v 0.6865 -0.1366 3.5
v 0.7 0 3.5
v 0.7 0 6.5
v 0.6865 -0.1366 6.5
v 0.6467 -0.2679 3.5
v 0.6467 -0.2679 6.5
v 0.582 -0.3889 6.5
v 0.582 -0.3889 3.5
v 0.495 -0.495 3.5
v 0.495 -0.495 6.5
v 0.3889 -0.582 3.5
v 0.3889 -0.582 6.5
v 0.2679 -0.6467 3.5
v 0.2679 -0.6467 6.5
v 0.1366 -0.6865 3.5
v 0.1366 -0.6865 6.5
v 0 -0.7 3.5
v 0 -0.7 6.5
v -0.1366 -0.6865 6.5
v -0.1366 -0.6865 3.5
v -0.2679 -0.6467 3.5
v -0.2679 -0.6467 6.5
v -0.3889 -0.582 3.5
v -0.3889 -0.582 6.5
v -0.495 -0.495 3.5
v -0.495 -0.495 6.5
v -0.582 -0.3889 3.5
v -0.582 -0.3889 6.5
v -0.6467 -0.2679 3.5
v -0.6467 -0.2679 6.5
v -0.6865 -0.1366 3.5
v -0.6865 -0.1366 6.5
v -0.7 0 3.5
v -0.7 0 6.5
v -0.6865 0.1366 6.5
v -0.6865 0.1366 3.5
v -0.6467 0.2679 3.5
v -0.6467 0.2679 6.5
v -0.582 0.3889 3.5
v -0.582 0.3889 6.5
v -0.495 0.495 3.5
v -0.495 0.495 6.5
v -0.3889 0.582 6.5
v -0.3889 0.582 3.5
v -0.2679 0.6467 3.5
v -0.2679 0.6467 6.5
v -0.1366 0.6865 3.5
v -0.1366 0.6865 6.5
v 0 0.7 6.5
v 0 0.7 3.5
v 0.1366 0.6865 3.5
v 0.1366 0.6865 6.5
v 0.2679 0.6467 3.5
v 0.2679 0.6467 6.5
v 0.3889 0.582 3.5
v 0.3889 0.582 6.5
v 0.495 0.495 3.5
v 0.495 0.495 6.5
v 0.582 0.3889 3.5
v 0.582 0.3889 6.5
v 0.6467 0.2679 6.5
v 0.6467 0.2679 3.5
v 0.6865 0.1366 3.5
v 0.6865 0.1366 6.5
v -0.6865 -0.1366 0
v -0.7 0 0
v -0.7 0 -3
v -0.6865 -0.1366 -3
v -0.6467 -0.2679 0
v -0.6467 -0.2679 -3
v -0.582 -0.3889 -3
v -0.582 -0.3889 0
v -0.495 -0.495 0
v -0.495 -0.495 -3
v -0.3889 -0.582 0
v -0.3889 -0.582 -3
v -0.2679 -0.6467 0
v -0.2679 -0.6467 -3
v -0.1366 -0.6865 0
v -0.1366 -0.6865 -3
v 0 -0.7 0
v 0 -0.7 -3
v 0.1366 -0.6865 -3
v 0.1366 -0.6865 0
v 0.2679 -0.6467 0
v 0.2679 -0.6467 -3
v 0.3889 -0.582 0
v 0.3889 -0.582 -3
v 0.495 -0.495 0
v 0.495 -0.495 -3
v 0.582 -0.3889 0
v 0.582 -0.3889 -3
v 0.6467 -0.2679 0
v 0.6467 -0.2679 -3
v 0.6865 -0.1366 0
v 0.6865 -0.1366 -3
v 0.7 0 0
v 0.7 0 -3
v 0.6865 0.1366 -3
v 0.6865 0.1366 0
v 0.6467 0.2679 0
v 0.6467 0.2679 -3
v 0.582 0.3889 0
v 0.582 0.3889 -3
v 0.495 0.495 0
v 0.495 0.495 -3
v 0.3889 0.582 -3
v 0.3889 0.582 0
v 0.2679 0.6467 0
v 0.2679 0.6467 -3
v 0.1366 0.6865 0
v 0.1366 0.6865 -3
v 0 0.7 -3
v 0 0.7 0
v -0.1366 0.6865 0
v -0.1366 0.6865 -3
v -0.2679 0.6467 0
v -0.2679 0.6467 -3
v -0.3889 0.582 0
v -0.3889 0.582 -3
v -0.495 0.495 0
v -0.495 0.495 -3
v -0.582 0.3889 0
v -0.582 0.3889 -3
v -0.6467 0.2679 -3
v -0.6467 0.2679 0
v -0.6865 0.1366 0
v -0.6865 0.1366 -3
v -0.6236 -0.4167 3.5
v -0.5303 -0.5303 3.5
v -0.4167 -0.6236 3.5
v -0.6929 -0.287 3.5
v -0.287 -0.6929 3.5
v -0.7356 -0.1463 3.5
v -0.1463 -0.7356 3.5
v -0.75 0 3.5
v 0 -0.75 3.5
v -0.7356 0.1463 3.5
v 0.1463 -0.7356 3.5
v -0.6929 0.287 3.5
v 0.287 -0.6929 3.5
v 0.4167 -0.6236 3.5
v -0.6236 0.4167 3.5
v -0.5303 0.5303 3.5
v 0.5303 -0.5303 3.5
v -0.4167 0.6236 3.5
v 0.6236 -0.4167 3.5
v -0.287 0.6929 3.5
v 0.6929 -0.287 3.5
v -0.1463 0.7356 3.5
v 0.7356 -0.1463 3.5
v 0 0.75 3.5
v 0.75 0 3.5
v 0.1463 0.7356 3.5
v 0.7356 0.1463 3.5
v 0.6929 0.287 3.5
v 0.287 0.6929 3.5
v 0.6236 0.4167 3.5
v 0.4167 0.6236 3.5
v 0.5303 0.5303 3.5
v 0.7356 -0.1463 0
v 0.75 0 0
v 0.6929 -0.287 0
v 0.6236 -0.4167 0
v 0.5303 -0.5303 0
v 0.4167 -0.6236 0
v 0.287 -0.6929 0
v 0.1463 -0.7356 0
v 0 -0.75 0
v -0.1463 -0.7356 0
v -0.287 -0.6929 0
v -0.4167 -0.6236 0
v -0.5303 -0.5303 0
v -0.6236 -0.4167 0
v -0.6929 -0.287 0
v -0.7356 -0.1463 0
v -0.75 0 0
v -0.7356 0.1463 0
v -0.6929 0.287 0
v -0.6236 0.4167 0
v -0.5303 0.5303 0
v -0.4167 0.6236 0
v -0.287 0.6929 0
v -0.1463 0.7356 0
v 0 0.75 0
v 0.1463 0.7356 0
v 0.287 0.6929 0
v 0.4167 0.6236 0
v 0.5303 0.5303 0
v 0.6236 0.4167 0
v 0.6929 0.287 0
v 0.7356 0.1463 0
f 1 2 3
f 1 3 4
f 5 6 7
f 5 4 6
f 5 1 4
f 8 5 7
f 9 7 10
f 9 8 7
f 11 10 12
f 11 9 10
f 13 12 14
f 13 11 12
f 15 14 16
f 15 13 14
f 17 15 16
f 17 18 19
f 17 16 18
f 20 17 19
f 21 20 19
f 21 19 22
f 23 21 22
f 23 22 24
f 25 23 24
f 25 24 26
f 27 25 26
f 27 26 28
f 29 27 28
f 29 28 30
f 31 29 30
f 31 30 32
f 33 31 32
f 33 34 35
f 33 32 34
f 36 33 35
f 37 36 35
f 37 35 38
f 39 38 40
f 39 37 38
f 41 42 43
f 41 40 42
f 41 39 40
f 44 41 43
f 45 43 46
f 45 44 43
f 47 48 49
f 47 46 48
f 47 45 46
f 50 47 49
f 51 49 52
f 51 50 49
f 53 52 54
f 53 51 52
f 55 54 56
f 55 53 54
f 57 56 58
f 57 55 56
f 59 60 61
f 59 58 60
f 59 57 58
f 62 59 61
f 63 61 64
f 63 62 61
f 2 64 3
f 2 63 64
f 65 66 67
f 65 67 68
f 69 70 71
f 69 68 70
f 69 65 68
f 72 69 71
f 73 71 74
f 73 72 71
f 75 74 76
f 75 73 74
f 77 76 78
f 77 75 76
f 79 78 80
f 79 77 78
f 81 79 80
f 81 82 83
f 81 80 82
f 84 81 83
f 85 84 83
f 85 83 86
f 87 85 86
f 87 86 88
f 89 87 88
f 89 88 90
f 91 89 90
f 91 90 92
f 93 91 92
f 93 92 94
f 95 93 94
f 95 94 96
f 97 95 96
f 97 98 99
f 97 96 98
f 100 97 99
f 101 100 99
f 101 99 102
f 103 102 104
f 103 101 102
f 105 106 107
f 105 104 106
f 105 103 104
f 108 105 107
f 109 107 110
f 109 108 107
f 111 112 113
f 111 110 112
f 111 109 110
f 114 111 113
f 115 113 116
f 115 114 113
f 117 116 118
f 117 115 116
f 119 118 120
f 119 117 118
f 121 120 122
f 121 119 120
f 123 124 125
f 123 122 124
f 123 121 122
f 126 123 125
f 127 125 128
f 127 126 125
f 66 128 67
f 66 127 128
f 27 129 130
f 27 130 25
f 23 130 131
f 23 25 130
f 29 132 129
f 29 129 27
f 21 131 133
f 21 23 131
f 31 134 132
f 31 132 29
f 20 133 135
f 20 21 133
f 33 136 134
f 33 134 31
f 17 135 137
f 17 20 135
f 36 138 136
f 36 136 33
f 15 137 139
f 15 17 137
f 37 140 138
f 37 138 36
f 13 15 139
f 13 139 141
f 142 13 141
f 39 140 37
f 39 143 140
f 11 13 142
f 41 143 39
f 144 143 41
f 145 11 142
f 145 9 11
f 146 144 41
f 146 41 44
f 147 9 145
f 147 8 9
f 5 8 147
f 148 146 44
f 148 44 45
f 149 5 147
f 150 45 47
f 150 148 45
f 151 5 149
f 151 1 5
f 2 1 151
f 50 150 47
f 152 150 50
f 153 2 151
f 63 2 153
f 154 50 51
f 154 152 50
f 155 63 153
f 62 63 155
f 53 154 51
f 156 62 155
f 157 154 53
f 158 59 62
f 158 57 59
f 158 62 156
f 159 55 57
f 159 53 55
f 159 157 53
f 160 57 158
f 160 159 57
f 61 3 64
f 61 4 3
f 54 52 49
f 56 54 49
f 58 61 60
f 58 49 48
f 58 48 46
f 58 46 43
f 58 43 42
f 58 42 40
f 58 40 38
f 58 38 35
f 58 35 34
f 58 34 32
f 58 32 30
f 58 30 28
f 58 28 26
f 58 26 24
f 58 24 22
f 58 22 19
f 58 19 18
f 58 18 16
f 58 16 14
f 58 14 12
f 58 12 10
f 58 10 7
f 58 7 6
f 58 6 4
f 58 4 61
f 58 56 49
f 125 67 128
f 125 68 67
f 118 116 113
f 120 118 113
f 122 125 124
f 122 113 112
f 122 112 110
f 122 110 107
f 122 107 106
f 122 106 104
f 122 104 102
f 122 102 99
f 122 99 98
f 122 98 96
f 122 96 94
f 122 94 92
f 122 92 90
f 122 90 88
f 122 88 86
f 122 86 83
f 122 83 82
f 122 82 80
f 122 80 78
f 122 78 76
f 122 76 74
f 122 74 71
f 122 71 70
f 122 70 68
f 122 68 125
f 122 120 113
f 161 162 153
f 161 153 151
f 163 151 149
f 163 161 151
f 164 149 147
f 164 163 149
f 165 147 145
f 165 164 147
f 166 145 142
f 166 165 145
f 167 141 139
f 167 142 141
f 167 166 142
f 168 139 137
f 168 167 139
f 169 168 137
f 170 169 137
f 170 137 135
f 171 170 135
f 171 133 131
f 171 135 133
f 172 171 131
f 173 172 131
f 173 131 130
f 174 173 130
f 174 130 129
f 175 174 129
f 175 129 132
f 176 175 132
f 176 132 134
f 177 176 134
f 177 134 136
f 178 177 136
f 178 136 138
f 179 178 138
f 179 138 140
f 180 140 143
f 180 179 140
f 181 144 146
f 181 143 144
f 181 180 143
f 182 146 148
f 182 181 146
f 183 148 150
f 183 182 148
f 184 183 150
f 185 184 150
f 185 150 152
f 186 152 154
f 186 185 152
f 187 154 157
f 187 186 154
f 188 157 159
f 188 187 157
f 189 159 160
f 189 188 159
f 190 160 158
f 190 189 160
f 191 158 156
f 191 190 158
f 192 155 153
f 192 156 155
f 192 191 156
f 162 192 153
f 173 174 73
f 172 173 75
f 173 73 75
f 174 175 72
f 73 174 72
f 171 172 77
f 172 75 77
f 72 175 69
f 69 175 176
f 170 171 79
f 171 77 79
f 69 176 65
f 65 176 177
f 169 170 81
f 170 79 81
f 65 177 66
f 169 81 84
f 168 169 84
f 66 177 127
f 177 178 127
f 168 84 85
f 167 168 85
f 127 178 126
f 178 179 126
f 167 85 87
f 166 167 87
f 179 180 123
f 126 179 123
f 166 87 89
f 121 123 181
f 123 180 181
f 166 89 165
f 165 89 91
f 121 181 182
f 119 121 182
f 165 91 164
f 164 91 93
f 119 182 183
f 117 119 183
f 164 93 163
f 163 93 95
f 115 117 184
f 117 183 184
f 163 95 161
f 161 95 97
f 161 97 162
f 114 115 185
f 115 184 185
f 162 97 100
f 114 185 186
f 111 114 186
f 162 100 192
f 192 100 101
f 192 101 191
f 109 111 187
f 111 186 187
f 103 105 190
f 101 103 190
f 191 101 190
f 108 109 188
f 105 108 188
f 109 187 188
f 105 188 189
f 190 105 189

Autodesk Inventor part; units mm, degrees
ref_plane "YZ Plane" through (0, 0, 0) normal (1, 0, 0) x (0, 1, 0)
ref_plane "XZ Plane" through (0, 0, 0) normal (0, 1, 0) x (-1, 0, 0)
ref_plane "XY Plane" through (0, 0, 0) normal (0, 0, 1) x (1, 0, 0)
sketch "Sketch1" plane through (0, 0, 0) normal (0, 0, 1) x (1, 0, 0)
  circle A0 centre (0, 0) radius 0.75
  dimension "d0" = 1.5
extrude "Extrusion1" add sketch "Sketch1" along normal blind 3.5
sketch "Sketch2" plane through (0, 0, 3.5) normal (0, 0, 1) x (1, 0, 0)
  circle A0 centre (0, 0) radius 0.75 projected
  circle A1 centre (0, 0) radius 0.7
  dimension "d3" = 1.4
extrude "Extrusion2" add sketch "Sketch2" along normal blind 3 contours A1
sketch "Sketch3" plane through (0, 0, 0) normal (0, 0, -1) x (-1, 0, 0)
  circle A0 centre (0, 0) radius 0.75 projected
  circle A1 centre (0, 0) radius 0.7
  dimension "d6" = 1.4
extrude "Extrusion3" add sketch "Sketch3" along normal blind 3 contours A1
thread "Thread1" size "M1.4x0.3" class "6g" standard "ANSI Metric M Profile" length 3
thread "Thread2" size "M1.4x0.3" class "6g" standard "ANSI Metric M Profile" length 3
properties part number "25 - Disc Arm 2" material "Bronze, Soft Tin"
